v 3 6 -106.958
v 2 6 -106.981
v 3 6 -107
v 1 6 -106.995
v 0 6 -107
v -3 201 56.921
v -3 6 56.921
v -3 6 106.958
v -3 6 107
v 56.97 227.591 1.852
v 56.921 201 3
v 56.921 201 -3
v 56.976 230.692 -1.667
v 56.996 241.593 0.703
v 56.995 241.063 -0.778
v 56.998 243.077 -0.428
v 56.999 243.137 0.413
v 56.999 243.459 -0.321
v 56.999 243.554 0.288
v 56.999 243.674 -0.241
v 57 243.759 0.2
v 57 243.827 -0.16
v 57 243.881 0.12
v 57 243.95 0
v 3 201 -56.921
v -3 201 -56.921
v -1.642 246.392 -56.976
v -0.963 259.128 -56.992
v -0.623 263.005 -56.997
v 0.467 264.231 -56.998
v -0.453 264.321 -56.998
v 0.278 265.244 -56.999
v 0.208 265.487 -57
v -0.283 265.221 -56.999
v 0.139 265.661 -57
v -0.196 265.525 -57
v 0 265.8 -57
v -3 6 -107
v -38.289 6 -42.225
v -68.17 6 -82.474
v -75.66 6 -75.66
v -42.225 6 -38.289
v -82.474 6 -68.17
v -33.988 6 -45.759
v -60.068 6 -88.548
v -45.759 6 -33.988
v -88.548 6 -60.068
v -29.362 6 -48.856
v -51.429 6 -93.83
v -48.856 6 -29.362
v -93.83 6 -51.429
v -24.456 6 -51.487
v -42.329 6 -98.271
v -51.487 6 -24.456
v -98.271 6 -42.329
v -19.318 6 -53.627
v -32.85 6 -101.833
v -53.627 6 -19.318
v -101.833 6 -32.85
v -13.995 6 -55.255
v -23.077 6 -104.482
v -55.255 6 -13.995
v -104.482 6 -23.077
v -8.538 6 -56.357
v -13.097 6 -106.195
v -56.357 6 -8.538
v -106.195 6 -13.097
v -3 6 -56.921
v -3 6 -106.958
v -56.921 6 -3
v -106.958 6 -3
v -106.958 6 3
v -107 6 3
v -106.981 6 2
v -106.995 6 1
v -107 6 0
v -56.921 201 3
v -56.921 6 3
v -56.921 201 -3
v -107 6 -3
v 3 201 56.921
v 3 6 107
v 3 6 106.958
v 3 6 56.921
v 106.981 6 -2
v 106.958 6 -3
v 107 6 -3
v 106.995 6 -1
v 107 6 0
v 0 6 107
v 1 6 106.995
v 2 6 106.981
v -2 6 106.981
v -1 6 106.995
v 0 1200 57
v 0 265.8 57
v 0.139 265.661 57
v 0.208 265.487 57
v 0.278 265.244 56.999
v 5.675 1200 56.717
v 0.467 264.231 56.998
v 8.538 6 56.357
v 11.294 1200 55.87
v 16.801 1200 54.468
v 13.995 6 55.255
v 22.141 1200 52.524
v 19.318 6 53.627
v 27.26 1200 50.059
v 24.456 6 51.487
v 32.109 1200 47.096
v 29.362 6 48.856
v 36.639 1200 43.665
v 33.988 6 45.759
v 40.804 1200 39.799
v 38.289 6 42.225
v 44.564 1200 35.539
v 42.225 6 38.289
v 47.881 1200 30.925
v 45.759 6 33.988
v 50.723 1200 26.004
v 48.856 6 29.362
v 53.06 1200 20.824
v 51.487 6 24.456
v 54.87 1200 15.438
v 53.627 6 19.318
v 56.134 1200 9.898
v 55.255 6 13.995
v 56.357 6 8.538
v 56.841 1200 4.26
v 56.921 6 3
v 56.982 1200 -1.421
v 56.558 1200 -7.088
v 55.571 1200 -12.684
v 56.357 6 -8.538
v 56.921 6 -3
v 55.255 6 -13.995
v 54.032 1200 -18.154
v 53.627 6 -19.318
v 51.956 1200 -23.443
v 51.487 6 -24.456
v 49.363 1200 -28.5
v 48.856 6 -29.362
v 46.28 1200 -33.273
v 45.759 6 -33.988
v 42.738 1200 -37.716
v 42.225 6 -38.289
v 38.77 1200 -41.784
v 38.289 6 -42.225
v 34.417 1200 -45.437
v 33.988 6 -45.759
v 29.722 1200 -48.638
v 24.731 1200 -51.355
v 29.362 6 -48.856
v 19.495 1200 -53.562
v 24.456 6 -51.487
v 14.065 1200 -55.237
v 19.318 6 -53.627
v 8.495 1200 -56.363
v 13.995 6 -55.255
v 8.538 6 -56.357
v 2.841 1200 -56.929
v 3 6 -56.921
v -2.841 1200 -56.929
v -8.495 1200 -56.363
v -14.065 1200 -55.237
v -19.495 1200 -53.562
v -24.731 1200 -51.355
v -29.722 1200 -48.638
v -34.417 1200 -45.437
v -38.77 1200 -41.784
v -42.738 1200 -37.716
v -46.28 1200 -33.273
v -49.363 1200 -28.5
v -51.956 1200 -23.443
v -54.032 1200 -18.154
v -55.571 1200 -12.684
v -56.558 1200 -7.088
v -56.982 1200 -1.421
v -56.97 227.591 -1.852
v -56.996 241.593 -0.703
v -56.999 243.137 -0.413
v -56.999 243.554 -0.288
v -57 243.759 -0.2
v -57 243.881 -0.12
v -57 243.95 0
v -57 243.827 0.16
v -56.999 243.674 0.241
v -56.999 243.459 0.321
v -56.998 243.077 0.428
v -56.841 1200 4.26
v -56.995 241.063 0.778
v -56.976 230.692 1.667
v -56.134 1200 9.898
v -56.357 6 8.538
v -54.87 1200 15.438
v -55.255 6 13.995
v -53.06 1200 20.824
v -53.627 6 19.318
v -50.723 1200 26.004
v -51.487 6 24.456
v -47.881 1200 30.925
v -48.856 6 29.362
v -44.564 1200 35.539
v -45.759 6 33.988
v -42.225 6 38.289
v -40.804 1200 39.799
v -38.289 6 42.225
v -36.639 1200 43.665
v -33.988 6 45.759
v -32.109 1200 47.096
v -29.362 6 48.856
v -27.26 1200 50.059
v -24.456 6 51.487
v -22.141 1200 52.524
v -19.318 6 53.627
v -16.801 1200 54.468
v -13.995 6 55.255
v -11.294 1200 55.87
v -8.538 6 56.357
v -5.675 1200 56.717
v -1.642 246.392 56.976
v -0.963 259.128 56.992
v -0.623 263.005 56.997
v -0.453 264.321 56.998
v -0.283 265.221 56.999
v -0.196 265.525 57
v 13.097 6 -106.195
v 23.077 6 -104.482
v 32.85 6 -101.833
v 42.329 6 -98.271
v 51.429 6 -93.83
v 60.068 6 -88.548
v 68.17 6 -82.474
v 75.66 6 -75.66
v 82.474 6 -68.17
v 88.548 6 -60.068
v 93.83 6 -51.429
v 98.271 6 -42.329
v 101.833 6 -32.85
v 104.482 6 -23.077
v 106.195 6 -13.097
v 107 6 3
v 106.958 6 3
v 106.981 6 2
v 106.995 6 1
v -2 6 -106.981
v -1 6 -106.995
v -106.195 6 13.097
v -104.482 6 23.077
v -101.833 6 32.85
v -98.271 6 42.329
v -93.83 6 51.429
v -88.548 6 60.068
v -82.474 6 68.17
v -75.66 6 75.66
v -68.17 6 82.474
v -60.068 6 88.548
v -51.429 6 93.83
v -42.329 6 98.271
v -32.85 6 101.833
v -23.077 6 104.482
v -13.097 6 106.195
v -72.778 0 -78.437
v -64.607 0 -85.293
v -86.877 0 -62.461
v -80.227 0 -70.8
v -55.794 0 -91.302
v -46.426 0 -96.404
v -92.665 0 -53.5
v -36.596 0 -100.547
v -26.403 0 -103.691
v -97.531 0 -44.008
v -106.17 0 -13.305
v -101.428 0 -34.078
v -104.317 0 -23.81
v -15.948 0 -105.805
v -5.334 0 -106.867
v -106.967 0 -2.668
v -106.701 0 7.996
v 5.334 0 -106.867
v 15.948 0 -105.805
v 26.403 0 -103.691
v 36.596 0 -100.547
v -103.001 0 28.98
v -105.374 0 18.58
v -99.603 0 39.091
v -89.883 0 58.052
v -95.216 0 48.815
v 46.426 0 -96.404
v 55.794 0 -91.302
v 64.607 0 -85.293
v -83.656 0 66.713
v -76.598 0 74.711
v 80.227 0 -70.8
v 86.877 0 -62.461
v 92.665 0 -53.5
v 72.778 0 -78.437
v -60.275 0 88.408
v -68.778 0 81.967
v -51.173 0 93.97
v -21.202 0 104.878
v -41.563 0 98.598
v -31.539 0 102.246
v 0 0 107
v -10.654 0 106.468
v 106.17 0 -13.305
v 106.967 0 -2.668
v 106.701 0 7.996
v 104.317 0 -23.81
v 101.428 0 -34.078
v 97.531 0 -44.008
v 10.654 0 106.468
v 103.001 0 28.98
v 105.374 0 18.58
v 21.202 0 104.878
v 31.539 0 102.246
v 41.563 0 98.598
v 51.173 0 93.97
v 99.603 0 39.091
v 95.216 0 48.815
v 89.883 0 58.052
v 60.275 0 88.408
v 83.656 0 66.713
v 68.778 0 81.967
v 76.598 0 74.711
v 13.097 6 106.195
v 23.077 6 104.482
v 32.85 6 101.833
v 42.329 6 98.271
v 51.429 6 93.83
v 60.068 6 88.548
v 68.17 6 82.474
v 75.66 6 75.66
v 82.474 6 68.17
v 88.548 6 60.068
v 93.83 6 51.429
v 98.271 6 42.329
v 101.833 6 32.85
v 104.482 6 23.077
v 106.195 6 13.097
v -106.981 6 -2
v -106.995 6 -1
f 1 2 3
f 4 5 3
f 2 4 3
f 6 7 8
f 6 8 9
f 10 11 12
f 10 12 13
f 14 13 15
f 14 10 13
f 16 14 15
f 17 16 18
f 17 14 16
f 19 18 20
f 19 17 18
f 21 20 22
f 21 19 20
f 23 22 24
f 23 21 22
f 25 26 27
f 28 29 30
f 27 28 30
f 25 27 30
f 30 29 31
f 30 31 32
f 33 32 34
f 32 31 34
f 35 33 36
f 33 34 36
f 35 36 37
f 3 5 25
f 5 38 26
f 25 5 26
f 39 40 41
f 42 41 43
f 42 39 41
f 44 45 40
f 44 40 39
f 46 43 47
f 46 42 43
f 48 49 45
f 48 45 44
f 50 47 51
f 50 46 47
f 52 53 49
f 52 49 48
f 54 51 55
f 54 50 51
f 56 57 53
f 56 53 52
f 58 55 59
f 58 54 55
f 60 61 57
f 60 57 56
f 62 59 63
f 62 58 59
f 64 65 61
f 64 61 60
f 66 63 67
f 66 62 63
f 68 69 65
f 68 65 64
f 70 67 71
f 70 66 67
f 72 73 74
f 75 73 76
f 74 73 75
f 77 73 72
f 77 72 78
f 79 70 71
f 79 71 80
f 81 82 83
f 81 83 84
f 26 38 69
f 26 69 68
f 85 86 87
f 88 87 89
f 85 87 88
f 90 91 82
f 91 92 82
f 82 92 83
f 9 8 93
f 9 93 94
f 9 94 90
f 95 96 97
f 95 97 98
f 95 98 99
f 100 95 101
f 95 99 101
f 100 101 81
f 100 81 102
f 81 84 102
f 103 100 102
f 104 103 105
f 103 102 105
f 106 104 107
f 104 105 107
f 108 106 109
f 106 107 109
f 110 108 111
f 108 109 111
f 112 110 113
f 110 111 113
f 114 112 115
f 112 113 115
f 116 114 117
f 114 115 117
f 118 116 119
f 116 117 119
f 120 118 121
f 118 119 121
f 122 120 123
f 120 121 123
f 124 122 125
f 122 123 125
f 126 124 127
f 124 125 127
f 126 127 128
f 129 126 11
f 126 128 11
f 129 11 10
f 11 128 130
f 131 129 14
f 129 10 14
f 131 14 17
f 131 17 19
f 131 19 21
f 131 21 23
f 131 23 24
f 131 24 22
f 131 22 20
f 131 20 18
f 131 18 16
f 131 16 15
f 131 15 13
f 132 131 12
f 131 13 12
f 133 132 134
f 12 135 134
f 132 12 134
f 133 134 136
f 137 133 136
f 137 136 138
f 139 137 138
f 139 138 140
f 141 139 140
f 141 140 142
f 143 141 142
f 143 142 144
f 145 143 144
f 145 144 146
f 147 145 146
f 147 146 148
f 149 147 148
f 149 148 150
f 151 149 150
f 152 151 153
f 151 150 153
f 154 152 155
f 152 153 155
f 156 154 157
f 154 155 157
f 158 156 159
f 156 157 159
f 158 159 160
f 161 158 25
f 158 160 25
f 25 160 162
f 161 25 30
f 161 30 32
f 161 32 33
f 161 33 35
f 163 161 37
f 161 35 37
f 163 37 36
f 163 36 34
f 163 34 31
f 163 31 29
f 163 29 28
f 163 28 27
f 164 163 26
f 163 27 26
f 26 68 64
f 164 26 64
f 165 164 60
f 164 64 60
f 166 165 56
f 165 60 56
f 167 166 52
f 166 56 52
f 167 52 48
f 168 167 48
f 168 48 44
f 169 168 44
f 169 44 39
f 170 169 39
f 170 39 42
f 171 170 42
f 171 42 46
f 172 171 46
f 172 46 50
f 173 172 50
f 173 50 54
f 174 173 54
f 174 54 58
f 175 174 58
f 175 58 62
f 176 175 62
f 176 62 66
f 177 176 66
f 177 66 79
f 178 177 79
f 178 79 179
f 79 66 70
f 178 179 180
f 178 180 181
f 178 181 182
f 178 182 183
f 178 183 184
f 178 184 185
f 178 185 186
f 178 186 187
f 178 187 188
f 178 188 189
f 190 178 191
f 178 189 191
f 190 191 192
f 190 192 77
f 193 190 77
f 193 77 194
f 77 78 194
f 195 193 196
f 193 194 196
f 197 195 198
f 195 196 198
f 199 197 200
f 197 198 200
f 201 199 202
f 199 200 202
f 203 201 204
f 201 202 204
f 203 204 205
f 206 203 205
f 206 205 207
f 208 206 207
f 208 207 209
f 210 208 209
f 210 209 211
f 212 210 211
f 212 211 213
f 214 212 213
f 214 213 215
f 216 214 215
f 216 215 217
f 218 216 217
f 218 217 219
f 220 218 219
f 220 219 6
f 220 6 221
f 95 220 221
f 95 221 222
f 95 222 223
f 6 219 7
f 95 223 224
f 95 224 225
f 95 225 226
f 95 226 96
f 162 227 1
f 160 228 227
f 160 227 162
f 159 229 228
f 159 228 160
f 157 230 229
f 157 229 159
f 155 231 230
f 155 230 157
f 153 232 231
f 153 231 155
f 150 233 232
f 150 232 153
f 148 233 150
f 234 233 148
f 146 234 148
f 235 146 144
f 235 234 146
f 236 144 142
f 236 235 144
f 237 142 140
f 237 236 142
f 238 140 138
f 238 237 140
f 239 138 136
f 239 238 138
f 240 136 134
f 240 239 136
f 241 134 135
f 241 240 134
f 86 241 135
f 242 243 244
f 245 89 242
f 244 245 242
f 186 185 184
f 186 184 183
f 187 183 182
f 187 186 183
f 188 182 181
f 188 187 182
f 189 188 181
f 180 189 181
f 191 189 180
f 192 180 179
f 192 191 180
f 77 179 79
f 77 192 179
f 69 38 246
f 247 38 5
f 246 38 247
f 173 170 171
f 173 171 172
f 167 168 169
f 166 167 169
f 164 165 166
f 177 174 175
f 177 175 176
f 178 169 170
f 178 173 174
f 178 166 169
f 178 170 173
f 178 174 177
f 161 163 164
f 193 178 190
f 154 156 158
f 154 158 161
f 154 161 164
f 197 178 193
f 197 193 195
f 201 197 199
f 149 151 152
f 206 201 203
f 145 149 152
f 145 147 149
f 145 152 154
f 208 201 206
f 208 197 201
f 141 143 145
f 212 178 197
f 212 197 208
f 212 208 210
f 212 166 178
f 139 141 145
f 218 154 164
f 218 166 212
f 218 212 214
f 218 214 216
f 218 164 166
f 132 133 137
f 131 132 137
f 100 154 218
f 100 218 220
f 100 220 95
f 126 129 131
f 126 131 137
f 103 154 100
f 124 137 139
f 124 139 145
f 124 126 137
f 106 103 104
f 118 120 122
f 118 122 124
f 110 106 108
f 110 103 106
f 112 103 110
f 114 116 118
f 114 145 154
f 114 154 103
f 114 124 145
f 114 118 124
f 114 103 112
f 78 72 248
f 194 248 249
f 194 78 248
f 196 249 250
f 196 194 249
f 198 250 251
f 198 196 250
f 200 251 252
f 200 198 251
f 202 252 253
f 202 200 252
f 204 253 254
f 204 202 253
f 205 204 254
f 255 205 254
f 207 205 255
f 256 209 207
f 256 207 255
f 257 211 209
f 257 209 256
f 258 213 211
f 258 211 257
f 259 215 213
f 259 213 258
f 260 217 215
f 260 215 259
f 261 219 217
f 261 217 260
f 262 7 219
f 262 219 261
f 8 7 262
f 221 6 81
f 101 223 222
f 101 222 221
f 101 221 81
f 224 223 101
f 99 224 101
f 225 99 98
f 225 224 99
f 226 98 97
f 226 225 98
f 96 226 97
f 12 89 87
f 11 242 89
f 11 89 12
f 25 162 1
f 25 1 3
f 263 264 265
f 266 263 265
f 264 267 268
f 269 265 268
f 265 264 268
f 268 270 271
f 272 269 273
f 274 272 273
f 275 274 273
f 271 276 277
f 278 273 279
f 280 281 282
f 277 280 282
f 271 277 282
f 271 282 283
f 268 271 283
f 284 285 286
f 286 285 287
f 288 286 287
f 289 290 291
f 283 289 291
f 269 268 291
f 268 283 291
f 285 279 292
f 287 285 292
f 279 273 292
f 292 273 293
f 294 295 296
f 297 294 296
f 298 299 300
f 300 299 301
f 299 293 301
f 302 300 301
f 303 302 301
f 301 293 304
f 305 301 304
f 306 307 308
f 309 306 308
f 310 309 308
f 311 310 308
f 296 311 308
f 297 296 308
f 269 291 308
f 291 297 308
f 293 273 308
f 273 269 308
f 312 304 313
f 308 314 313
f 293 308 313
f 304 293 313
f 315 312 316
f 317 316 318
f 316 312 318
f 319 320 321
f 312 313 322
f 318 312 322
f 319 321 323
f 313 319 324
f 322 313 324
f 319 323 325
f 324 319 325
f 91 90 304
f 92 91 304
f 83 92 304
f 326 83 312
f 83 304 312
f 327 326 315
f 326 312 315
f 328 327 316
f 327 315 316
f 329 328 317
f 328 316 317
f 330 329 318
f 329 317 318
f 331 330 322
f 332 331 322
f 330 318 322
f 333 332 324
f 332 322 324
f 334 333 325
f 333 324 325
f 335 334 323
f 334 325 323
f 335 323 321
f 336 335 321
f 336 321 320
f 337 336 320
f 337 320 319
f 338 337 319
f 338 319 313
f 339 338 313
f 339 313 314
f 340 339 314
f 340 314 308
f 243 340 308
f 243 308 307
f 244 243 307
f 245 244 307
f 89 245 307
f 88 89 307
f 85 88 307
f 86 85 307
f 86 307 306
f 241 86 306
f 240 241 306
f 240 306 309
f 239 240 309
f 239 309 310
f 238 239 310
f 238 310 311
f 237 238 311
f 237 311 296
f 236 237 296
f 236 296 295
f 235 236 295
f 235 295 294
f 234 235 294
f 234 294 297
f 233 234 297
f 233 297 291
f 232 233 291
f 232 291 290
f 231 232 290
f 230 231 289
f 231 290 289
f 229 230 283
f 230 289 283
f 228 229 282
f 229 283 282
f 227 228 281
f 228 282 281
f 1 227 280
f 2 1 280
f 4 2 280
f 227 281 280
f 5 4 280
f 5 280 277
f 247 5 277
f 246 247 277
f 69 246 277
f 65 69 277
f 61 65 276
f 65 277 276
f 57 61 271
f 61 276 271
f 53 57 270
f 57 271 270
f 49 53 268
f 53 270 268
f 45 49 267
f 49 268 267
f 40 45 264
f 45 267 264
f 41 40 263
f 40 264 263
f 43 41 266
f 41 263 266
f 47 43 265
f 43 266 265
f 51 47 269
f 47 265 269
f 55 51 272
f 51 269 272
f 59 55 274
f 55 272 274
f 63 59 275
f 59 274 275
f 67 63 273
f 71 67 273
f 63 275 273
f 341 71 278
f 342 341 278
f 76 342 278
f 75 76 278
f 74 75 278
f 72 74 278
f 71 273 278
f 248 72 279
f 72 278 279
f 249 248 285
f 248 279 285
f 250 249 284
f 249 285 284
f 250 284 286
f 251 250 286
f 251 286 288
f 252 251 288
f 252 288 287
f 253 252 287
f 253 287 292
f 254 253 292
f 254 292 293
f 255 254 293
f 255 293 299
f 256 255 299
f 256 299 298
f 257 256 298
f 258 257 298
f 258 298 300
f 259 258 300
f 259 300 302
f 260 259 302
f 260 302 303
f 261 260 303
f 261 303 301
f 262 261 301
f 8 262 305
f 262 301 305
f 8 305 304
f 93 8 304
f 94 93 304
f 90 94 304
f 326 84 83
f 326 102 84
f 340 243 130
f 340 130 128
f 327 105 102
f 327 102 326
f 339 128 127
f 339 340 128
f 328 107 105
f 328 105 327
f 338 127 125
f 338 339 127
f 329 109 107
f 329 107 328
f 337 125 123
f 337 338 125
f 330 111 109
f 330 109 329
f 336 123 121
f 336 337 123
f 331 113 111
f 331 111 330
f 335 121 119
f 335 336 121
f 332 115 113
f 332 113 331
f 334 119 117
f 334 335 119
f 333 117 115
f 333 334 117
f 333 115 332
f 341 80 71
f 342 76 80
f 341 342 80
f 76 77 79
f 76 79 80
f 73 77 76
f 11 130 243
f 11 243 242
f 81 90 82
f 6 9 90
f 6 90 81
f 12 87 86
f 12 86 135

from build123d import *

# Parameters (mm, degrees)
SKETCH1_R           = 107
BOSS_EXTRUDE1_DEPTH = 6
SKETCH2_R           = 57
BOSS_EXTRUDE2_DEPTH = 1194
BOSS_EXTRUDE3_DEPTH = 195
CUT_EXTRUDE1_DEPTH  = 1210.772292624
CUT_EXTRUDE2_DEPTH  = 1210.772292624


with BuildPart() as part:
    # Sketch1 → Boss-Extrude1 (new body)
    with BuildSketch(Plane(origin=(0, 0, 0), x_dir=(1, 0, 0), z_dir=(0, 1, 0))):
        with Locations(Location((0, 0, 0), (0, 0, 270))):
            Circle(SKETCH1_R)
    extrude(amount=BOSS_EXTRUDE1_DEPTH)

    # Sketch2 → Boss-Extrude2 (add)
    with BuildSketch(Plane(origin=(0, 6, 0), x_dir=(1, 0, 0), z_dir=(0, 1, 0))):
        with Locations(Location((0, 0, 0), (0, 0, 270))):
            Circle(SKETCH2_R)
    extrude(amount=BOSS_EXTRUDE2_DEPTH)

    # Sketch3 → Boss-Extrude3 (add)
    with BuildSketch(Plane(origin=(0, 6, 0), x_dir=(1, 0, 0), z_dir=(0, 1, 0))):
        Polygon((-107, 0), (-107, -3), (-3, -3), (-3, -107), (3, -107), (3, -3), (107, -3), (107, 3), (3, 3), (3, 107), (0, 107), (-3, 107), (-3, 3), (-107, 3), align=None)
    extrude(amount=BOSS_EXTRUDE3_DEPTH)

    # Sketch4 → Cut-Extrude1 (cut, through all)
    with BuildSketch(Plane.XY.offset(3)):
        Polygon((-56.920997883, 201), (-107, 6), (-153.843462946, 6), (-153.843462946, 243.950118008), (-57, 243.950118008), align=None)
        Polygon((107, 6), (56.920997883, 201), (57, 243.950118008), (157.678532458, 243.950118008), (157.678532458, 6), align=None)
    extrude(amount=-CUT_EXTRUDE1_DEPTH, mode=Mode.SUBTRACT)

    # Sketch6 → Cut-Extrude2 (cut, through all)
    with BuildSketch(Plane.ZY.offset(3)):
        Polygon((-107, 6), (-56.920997883, 201), (-57, 265.799576447), (-234.352889602, 265.799576447), (-234.352889602, 6), align=None)
        Polygon((107, 6), (56.920997883, 201), (57, 265.799576447), (191.443205591, 265.799576447), (191.443205591, 6), align=None)
    extrude(amount=-CUT_EXTRUDE2_DEPTH, mode=Mode.SUBTRACT)


solid = part.part
